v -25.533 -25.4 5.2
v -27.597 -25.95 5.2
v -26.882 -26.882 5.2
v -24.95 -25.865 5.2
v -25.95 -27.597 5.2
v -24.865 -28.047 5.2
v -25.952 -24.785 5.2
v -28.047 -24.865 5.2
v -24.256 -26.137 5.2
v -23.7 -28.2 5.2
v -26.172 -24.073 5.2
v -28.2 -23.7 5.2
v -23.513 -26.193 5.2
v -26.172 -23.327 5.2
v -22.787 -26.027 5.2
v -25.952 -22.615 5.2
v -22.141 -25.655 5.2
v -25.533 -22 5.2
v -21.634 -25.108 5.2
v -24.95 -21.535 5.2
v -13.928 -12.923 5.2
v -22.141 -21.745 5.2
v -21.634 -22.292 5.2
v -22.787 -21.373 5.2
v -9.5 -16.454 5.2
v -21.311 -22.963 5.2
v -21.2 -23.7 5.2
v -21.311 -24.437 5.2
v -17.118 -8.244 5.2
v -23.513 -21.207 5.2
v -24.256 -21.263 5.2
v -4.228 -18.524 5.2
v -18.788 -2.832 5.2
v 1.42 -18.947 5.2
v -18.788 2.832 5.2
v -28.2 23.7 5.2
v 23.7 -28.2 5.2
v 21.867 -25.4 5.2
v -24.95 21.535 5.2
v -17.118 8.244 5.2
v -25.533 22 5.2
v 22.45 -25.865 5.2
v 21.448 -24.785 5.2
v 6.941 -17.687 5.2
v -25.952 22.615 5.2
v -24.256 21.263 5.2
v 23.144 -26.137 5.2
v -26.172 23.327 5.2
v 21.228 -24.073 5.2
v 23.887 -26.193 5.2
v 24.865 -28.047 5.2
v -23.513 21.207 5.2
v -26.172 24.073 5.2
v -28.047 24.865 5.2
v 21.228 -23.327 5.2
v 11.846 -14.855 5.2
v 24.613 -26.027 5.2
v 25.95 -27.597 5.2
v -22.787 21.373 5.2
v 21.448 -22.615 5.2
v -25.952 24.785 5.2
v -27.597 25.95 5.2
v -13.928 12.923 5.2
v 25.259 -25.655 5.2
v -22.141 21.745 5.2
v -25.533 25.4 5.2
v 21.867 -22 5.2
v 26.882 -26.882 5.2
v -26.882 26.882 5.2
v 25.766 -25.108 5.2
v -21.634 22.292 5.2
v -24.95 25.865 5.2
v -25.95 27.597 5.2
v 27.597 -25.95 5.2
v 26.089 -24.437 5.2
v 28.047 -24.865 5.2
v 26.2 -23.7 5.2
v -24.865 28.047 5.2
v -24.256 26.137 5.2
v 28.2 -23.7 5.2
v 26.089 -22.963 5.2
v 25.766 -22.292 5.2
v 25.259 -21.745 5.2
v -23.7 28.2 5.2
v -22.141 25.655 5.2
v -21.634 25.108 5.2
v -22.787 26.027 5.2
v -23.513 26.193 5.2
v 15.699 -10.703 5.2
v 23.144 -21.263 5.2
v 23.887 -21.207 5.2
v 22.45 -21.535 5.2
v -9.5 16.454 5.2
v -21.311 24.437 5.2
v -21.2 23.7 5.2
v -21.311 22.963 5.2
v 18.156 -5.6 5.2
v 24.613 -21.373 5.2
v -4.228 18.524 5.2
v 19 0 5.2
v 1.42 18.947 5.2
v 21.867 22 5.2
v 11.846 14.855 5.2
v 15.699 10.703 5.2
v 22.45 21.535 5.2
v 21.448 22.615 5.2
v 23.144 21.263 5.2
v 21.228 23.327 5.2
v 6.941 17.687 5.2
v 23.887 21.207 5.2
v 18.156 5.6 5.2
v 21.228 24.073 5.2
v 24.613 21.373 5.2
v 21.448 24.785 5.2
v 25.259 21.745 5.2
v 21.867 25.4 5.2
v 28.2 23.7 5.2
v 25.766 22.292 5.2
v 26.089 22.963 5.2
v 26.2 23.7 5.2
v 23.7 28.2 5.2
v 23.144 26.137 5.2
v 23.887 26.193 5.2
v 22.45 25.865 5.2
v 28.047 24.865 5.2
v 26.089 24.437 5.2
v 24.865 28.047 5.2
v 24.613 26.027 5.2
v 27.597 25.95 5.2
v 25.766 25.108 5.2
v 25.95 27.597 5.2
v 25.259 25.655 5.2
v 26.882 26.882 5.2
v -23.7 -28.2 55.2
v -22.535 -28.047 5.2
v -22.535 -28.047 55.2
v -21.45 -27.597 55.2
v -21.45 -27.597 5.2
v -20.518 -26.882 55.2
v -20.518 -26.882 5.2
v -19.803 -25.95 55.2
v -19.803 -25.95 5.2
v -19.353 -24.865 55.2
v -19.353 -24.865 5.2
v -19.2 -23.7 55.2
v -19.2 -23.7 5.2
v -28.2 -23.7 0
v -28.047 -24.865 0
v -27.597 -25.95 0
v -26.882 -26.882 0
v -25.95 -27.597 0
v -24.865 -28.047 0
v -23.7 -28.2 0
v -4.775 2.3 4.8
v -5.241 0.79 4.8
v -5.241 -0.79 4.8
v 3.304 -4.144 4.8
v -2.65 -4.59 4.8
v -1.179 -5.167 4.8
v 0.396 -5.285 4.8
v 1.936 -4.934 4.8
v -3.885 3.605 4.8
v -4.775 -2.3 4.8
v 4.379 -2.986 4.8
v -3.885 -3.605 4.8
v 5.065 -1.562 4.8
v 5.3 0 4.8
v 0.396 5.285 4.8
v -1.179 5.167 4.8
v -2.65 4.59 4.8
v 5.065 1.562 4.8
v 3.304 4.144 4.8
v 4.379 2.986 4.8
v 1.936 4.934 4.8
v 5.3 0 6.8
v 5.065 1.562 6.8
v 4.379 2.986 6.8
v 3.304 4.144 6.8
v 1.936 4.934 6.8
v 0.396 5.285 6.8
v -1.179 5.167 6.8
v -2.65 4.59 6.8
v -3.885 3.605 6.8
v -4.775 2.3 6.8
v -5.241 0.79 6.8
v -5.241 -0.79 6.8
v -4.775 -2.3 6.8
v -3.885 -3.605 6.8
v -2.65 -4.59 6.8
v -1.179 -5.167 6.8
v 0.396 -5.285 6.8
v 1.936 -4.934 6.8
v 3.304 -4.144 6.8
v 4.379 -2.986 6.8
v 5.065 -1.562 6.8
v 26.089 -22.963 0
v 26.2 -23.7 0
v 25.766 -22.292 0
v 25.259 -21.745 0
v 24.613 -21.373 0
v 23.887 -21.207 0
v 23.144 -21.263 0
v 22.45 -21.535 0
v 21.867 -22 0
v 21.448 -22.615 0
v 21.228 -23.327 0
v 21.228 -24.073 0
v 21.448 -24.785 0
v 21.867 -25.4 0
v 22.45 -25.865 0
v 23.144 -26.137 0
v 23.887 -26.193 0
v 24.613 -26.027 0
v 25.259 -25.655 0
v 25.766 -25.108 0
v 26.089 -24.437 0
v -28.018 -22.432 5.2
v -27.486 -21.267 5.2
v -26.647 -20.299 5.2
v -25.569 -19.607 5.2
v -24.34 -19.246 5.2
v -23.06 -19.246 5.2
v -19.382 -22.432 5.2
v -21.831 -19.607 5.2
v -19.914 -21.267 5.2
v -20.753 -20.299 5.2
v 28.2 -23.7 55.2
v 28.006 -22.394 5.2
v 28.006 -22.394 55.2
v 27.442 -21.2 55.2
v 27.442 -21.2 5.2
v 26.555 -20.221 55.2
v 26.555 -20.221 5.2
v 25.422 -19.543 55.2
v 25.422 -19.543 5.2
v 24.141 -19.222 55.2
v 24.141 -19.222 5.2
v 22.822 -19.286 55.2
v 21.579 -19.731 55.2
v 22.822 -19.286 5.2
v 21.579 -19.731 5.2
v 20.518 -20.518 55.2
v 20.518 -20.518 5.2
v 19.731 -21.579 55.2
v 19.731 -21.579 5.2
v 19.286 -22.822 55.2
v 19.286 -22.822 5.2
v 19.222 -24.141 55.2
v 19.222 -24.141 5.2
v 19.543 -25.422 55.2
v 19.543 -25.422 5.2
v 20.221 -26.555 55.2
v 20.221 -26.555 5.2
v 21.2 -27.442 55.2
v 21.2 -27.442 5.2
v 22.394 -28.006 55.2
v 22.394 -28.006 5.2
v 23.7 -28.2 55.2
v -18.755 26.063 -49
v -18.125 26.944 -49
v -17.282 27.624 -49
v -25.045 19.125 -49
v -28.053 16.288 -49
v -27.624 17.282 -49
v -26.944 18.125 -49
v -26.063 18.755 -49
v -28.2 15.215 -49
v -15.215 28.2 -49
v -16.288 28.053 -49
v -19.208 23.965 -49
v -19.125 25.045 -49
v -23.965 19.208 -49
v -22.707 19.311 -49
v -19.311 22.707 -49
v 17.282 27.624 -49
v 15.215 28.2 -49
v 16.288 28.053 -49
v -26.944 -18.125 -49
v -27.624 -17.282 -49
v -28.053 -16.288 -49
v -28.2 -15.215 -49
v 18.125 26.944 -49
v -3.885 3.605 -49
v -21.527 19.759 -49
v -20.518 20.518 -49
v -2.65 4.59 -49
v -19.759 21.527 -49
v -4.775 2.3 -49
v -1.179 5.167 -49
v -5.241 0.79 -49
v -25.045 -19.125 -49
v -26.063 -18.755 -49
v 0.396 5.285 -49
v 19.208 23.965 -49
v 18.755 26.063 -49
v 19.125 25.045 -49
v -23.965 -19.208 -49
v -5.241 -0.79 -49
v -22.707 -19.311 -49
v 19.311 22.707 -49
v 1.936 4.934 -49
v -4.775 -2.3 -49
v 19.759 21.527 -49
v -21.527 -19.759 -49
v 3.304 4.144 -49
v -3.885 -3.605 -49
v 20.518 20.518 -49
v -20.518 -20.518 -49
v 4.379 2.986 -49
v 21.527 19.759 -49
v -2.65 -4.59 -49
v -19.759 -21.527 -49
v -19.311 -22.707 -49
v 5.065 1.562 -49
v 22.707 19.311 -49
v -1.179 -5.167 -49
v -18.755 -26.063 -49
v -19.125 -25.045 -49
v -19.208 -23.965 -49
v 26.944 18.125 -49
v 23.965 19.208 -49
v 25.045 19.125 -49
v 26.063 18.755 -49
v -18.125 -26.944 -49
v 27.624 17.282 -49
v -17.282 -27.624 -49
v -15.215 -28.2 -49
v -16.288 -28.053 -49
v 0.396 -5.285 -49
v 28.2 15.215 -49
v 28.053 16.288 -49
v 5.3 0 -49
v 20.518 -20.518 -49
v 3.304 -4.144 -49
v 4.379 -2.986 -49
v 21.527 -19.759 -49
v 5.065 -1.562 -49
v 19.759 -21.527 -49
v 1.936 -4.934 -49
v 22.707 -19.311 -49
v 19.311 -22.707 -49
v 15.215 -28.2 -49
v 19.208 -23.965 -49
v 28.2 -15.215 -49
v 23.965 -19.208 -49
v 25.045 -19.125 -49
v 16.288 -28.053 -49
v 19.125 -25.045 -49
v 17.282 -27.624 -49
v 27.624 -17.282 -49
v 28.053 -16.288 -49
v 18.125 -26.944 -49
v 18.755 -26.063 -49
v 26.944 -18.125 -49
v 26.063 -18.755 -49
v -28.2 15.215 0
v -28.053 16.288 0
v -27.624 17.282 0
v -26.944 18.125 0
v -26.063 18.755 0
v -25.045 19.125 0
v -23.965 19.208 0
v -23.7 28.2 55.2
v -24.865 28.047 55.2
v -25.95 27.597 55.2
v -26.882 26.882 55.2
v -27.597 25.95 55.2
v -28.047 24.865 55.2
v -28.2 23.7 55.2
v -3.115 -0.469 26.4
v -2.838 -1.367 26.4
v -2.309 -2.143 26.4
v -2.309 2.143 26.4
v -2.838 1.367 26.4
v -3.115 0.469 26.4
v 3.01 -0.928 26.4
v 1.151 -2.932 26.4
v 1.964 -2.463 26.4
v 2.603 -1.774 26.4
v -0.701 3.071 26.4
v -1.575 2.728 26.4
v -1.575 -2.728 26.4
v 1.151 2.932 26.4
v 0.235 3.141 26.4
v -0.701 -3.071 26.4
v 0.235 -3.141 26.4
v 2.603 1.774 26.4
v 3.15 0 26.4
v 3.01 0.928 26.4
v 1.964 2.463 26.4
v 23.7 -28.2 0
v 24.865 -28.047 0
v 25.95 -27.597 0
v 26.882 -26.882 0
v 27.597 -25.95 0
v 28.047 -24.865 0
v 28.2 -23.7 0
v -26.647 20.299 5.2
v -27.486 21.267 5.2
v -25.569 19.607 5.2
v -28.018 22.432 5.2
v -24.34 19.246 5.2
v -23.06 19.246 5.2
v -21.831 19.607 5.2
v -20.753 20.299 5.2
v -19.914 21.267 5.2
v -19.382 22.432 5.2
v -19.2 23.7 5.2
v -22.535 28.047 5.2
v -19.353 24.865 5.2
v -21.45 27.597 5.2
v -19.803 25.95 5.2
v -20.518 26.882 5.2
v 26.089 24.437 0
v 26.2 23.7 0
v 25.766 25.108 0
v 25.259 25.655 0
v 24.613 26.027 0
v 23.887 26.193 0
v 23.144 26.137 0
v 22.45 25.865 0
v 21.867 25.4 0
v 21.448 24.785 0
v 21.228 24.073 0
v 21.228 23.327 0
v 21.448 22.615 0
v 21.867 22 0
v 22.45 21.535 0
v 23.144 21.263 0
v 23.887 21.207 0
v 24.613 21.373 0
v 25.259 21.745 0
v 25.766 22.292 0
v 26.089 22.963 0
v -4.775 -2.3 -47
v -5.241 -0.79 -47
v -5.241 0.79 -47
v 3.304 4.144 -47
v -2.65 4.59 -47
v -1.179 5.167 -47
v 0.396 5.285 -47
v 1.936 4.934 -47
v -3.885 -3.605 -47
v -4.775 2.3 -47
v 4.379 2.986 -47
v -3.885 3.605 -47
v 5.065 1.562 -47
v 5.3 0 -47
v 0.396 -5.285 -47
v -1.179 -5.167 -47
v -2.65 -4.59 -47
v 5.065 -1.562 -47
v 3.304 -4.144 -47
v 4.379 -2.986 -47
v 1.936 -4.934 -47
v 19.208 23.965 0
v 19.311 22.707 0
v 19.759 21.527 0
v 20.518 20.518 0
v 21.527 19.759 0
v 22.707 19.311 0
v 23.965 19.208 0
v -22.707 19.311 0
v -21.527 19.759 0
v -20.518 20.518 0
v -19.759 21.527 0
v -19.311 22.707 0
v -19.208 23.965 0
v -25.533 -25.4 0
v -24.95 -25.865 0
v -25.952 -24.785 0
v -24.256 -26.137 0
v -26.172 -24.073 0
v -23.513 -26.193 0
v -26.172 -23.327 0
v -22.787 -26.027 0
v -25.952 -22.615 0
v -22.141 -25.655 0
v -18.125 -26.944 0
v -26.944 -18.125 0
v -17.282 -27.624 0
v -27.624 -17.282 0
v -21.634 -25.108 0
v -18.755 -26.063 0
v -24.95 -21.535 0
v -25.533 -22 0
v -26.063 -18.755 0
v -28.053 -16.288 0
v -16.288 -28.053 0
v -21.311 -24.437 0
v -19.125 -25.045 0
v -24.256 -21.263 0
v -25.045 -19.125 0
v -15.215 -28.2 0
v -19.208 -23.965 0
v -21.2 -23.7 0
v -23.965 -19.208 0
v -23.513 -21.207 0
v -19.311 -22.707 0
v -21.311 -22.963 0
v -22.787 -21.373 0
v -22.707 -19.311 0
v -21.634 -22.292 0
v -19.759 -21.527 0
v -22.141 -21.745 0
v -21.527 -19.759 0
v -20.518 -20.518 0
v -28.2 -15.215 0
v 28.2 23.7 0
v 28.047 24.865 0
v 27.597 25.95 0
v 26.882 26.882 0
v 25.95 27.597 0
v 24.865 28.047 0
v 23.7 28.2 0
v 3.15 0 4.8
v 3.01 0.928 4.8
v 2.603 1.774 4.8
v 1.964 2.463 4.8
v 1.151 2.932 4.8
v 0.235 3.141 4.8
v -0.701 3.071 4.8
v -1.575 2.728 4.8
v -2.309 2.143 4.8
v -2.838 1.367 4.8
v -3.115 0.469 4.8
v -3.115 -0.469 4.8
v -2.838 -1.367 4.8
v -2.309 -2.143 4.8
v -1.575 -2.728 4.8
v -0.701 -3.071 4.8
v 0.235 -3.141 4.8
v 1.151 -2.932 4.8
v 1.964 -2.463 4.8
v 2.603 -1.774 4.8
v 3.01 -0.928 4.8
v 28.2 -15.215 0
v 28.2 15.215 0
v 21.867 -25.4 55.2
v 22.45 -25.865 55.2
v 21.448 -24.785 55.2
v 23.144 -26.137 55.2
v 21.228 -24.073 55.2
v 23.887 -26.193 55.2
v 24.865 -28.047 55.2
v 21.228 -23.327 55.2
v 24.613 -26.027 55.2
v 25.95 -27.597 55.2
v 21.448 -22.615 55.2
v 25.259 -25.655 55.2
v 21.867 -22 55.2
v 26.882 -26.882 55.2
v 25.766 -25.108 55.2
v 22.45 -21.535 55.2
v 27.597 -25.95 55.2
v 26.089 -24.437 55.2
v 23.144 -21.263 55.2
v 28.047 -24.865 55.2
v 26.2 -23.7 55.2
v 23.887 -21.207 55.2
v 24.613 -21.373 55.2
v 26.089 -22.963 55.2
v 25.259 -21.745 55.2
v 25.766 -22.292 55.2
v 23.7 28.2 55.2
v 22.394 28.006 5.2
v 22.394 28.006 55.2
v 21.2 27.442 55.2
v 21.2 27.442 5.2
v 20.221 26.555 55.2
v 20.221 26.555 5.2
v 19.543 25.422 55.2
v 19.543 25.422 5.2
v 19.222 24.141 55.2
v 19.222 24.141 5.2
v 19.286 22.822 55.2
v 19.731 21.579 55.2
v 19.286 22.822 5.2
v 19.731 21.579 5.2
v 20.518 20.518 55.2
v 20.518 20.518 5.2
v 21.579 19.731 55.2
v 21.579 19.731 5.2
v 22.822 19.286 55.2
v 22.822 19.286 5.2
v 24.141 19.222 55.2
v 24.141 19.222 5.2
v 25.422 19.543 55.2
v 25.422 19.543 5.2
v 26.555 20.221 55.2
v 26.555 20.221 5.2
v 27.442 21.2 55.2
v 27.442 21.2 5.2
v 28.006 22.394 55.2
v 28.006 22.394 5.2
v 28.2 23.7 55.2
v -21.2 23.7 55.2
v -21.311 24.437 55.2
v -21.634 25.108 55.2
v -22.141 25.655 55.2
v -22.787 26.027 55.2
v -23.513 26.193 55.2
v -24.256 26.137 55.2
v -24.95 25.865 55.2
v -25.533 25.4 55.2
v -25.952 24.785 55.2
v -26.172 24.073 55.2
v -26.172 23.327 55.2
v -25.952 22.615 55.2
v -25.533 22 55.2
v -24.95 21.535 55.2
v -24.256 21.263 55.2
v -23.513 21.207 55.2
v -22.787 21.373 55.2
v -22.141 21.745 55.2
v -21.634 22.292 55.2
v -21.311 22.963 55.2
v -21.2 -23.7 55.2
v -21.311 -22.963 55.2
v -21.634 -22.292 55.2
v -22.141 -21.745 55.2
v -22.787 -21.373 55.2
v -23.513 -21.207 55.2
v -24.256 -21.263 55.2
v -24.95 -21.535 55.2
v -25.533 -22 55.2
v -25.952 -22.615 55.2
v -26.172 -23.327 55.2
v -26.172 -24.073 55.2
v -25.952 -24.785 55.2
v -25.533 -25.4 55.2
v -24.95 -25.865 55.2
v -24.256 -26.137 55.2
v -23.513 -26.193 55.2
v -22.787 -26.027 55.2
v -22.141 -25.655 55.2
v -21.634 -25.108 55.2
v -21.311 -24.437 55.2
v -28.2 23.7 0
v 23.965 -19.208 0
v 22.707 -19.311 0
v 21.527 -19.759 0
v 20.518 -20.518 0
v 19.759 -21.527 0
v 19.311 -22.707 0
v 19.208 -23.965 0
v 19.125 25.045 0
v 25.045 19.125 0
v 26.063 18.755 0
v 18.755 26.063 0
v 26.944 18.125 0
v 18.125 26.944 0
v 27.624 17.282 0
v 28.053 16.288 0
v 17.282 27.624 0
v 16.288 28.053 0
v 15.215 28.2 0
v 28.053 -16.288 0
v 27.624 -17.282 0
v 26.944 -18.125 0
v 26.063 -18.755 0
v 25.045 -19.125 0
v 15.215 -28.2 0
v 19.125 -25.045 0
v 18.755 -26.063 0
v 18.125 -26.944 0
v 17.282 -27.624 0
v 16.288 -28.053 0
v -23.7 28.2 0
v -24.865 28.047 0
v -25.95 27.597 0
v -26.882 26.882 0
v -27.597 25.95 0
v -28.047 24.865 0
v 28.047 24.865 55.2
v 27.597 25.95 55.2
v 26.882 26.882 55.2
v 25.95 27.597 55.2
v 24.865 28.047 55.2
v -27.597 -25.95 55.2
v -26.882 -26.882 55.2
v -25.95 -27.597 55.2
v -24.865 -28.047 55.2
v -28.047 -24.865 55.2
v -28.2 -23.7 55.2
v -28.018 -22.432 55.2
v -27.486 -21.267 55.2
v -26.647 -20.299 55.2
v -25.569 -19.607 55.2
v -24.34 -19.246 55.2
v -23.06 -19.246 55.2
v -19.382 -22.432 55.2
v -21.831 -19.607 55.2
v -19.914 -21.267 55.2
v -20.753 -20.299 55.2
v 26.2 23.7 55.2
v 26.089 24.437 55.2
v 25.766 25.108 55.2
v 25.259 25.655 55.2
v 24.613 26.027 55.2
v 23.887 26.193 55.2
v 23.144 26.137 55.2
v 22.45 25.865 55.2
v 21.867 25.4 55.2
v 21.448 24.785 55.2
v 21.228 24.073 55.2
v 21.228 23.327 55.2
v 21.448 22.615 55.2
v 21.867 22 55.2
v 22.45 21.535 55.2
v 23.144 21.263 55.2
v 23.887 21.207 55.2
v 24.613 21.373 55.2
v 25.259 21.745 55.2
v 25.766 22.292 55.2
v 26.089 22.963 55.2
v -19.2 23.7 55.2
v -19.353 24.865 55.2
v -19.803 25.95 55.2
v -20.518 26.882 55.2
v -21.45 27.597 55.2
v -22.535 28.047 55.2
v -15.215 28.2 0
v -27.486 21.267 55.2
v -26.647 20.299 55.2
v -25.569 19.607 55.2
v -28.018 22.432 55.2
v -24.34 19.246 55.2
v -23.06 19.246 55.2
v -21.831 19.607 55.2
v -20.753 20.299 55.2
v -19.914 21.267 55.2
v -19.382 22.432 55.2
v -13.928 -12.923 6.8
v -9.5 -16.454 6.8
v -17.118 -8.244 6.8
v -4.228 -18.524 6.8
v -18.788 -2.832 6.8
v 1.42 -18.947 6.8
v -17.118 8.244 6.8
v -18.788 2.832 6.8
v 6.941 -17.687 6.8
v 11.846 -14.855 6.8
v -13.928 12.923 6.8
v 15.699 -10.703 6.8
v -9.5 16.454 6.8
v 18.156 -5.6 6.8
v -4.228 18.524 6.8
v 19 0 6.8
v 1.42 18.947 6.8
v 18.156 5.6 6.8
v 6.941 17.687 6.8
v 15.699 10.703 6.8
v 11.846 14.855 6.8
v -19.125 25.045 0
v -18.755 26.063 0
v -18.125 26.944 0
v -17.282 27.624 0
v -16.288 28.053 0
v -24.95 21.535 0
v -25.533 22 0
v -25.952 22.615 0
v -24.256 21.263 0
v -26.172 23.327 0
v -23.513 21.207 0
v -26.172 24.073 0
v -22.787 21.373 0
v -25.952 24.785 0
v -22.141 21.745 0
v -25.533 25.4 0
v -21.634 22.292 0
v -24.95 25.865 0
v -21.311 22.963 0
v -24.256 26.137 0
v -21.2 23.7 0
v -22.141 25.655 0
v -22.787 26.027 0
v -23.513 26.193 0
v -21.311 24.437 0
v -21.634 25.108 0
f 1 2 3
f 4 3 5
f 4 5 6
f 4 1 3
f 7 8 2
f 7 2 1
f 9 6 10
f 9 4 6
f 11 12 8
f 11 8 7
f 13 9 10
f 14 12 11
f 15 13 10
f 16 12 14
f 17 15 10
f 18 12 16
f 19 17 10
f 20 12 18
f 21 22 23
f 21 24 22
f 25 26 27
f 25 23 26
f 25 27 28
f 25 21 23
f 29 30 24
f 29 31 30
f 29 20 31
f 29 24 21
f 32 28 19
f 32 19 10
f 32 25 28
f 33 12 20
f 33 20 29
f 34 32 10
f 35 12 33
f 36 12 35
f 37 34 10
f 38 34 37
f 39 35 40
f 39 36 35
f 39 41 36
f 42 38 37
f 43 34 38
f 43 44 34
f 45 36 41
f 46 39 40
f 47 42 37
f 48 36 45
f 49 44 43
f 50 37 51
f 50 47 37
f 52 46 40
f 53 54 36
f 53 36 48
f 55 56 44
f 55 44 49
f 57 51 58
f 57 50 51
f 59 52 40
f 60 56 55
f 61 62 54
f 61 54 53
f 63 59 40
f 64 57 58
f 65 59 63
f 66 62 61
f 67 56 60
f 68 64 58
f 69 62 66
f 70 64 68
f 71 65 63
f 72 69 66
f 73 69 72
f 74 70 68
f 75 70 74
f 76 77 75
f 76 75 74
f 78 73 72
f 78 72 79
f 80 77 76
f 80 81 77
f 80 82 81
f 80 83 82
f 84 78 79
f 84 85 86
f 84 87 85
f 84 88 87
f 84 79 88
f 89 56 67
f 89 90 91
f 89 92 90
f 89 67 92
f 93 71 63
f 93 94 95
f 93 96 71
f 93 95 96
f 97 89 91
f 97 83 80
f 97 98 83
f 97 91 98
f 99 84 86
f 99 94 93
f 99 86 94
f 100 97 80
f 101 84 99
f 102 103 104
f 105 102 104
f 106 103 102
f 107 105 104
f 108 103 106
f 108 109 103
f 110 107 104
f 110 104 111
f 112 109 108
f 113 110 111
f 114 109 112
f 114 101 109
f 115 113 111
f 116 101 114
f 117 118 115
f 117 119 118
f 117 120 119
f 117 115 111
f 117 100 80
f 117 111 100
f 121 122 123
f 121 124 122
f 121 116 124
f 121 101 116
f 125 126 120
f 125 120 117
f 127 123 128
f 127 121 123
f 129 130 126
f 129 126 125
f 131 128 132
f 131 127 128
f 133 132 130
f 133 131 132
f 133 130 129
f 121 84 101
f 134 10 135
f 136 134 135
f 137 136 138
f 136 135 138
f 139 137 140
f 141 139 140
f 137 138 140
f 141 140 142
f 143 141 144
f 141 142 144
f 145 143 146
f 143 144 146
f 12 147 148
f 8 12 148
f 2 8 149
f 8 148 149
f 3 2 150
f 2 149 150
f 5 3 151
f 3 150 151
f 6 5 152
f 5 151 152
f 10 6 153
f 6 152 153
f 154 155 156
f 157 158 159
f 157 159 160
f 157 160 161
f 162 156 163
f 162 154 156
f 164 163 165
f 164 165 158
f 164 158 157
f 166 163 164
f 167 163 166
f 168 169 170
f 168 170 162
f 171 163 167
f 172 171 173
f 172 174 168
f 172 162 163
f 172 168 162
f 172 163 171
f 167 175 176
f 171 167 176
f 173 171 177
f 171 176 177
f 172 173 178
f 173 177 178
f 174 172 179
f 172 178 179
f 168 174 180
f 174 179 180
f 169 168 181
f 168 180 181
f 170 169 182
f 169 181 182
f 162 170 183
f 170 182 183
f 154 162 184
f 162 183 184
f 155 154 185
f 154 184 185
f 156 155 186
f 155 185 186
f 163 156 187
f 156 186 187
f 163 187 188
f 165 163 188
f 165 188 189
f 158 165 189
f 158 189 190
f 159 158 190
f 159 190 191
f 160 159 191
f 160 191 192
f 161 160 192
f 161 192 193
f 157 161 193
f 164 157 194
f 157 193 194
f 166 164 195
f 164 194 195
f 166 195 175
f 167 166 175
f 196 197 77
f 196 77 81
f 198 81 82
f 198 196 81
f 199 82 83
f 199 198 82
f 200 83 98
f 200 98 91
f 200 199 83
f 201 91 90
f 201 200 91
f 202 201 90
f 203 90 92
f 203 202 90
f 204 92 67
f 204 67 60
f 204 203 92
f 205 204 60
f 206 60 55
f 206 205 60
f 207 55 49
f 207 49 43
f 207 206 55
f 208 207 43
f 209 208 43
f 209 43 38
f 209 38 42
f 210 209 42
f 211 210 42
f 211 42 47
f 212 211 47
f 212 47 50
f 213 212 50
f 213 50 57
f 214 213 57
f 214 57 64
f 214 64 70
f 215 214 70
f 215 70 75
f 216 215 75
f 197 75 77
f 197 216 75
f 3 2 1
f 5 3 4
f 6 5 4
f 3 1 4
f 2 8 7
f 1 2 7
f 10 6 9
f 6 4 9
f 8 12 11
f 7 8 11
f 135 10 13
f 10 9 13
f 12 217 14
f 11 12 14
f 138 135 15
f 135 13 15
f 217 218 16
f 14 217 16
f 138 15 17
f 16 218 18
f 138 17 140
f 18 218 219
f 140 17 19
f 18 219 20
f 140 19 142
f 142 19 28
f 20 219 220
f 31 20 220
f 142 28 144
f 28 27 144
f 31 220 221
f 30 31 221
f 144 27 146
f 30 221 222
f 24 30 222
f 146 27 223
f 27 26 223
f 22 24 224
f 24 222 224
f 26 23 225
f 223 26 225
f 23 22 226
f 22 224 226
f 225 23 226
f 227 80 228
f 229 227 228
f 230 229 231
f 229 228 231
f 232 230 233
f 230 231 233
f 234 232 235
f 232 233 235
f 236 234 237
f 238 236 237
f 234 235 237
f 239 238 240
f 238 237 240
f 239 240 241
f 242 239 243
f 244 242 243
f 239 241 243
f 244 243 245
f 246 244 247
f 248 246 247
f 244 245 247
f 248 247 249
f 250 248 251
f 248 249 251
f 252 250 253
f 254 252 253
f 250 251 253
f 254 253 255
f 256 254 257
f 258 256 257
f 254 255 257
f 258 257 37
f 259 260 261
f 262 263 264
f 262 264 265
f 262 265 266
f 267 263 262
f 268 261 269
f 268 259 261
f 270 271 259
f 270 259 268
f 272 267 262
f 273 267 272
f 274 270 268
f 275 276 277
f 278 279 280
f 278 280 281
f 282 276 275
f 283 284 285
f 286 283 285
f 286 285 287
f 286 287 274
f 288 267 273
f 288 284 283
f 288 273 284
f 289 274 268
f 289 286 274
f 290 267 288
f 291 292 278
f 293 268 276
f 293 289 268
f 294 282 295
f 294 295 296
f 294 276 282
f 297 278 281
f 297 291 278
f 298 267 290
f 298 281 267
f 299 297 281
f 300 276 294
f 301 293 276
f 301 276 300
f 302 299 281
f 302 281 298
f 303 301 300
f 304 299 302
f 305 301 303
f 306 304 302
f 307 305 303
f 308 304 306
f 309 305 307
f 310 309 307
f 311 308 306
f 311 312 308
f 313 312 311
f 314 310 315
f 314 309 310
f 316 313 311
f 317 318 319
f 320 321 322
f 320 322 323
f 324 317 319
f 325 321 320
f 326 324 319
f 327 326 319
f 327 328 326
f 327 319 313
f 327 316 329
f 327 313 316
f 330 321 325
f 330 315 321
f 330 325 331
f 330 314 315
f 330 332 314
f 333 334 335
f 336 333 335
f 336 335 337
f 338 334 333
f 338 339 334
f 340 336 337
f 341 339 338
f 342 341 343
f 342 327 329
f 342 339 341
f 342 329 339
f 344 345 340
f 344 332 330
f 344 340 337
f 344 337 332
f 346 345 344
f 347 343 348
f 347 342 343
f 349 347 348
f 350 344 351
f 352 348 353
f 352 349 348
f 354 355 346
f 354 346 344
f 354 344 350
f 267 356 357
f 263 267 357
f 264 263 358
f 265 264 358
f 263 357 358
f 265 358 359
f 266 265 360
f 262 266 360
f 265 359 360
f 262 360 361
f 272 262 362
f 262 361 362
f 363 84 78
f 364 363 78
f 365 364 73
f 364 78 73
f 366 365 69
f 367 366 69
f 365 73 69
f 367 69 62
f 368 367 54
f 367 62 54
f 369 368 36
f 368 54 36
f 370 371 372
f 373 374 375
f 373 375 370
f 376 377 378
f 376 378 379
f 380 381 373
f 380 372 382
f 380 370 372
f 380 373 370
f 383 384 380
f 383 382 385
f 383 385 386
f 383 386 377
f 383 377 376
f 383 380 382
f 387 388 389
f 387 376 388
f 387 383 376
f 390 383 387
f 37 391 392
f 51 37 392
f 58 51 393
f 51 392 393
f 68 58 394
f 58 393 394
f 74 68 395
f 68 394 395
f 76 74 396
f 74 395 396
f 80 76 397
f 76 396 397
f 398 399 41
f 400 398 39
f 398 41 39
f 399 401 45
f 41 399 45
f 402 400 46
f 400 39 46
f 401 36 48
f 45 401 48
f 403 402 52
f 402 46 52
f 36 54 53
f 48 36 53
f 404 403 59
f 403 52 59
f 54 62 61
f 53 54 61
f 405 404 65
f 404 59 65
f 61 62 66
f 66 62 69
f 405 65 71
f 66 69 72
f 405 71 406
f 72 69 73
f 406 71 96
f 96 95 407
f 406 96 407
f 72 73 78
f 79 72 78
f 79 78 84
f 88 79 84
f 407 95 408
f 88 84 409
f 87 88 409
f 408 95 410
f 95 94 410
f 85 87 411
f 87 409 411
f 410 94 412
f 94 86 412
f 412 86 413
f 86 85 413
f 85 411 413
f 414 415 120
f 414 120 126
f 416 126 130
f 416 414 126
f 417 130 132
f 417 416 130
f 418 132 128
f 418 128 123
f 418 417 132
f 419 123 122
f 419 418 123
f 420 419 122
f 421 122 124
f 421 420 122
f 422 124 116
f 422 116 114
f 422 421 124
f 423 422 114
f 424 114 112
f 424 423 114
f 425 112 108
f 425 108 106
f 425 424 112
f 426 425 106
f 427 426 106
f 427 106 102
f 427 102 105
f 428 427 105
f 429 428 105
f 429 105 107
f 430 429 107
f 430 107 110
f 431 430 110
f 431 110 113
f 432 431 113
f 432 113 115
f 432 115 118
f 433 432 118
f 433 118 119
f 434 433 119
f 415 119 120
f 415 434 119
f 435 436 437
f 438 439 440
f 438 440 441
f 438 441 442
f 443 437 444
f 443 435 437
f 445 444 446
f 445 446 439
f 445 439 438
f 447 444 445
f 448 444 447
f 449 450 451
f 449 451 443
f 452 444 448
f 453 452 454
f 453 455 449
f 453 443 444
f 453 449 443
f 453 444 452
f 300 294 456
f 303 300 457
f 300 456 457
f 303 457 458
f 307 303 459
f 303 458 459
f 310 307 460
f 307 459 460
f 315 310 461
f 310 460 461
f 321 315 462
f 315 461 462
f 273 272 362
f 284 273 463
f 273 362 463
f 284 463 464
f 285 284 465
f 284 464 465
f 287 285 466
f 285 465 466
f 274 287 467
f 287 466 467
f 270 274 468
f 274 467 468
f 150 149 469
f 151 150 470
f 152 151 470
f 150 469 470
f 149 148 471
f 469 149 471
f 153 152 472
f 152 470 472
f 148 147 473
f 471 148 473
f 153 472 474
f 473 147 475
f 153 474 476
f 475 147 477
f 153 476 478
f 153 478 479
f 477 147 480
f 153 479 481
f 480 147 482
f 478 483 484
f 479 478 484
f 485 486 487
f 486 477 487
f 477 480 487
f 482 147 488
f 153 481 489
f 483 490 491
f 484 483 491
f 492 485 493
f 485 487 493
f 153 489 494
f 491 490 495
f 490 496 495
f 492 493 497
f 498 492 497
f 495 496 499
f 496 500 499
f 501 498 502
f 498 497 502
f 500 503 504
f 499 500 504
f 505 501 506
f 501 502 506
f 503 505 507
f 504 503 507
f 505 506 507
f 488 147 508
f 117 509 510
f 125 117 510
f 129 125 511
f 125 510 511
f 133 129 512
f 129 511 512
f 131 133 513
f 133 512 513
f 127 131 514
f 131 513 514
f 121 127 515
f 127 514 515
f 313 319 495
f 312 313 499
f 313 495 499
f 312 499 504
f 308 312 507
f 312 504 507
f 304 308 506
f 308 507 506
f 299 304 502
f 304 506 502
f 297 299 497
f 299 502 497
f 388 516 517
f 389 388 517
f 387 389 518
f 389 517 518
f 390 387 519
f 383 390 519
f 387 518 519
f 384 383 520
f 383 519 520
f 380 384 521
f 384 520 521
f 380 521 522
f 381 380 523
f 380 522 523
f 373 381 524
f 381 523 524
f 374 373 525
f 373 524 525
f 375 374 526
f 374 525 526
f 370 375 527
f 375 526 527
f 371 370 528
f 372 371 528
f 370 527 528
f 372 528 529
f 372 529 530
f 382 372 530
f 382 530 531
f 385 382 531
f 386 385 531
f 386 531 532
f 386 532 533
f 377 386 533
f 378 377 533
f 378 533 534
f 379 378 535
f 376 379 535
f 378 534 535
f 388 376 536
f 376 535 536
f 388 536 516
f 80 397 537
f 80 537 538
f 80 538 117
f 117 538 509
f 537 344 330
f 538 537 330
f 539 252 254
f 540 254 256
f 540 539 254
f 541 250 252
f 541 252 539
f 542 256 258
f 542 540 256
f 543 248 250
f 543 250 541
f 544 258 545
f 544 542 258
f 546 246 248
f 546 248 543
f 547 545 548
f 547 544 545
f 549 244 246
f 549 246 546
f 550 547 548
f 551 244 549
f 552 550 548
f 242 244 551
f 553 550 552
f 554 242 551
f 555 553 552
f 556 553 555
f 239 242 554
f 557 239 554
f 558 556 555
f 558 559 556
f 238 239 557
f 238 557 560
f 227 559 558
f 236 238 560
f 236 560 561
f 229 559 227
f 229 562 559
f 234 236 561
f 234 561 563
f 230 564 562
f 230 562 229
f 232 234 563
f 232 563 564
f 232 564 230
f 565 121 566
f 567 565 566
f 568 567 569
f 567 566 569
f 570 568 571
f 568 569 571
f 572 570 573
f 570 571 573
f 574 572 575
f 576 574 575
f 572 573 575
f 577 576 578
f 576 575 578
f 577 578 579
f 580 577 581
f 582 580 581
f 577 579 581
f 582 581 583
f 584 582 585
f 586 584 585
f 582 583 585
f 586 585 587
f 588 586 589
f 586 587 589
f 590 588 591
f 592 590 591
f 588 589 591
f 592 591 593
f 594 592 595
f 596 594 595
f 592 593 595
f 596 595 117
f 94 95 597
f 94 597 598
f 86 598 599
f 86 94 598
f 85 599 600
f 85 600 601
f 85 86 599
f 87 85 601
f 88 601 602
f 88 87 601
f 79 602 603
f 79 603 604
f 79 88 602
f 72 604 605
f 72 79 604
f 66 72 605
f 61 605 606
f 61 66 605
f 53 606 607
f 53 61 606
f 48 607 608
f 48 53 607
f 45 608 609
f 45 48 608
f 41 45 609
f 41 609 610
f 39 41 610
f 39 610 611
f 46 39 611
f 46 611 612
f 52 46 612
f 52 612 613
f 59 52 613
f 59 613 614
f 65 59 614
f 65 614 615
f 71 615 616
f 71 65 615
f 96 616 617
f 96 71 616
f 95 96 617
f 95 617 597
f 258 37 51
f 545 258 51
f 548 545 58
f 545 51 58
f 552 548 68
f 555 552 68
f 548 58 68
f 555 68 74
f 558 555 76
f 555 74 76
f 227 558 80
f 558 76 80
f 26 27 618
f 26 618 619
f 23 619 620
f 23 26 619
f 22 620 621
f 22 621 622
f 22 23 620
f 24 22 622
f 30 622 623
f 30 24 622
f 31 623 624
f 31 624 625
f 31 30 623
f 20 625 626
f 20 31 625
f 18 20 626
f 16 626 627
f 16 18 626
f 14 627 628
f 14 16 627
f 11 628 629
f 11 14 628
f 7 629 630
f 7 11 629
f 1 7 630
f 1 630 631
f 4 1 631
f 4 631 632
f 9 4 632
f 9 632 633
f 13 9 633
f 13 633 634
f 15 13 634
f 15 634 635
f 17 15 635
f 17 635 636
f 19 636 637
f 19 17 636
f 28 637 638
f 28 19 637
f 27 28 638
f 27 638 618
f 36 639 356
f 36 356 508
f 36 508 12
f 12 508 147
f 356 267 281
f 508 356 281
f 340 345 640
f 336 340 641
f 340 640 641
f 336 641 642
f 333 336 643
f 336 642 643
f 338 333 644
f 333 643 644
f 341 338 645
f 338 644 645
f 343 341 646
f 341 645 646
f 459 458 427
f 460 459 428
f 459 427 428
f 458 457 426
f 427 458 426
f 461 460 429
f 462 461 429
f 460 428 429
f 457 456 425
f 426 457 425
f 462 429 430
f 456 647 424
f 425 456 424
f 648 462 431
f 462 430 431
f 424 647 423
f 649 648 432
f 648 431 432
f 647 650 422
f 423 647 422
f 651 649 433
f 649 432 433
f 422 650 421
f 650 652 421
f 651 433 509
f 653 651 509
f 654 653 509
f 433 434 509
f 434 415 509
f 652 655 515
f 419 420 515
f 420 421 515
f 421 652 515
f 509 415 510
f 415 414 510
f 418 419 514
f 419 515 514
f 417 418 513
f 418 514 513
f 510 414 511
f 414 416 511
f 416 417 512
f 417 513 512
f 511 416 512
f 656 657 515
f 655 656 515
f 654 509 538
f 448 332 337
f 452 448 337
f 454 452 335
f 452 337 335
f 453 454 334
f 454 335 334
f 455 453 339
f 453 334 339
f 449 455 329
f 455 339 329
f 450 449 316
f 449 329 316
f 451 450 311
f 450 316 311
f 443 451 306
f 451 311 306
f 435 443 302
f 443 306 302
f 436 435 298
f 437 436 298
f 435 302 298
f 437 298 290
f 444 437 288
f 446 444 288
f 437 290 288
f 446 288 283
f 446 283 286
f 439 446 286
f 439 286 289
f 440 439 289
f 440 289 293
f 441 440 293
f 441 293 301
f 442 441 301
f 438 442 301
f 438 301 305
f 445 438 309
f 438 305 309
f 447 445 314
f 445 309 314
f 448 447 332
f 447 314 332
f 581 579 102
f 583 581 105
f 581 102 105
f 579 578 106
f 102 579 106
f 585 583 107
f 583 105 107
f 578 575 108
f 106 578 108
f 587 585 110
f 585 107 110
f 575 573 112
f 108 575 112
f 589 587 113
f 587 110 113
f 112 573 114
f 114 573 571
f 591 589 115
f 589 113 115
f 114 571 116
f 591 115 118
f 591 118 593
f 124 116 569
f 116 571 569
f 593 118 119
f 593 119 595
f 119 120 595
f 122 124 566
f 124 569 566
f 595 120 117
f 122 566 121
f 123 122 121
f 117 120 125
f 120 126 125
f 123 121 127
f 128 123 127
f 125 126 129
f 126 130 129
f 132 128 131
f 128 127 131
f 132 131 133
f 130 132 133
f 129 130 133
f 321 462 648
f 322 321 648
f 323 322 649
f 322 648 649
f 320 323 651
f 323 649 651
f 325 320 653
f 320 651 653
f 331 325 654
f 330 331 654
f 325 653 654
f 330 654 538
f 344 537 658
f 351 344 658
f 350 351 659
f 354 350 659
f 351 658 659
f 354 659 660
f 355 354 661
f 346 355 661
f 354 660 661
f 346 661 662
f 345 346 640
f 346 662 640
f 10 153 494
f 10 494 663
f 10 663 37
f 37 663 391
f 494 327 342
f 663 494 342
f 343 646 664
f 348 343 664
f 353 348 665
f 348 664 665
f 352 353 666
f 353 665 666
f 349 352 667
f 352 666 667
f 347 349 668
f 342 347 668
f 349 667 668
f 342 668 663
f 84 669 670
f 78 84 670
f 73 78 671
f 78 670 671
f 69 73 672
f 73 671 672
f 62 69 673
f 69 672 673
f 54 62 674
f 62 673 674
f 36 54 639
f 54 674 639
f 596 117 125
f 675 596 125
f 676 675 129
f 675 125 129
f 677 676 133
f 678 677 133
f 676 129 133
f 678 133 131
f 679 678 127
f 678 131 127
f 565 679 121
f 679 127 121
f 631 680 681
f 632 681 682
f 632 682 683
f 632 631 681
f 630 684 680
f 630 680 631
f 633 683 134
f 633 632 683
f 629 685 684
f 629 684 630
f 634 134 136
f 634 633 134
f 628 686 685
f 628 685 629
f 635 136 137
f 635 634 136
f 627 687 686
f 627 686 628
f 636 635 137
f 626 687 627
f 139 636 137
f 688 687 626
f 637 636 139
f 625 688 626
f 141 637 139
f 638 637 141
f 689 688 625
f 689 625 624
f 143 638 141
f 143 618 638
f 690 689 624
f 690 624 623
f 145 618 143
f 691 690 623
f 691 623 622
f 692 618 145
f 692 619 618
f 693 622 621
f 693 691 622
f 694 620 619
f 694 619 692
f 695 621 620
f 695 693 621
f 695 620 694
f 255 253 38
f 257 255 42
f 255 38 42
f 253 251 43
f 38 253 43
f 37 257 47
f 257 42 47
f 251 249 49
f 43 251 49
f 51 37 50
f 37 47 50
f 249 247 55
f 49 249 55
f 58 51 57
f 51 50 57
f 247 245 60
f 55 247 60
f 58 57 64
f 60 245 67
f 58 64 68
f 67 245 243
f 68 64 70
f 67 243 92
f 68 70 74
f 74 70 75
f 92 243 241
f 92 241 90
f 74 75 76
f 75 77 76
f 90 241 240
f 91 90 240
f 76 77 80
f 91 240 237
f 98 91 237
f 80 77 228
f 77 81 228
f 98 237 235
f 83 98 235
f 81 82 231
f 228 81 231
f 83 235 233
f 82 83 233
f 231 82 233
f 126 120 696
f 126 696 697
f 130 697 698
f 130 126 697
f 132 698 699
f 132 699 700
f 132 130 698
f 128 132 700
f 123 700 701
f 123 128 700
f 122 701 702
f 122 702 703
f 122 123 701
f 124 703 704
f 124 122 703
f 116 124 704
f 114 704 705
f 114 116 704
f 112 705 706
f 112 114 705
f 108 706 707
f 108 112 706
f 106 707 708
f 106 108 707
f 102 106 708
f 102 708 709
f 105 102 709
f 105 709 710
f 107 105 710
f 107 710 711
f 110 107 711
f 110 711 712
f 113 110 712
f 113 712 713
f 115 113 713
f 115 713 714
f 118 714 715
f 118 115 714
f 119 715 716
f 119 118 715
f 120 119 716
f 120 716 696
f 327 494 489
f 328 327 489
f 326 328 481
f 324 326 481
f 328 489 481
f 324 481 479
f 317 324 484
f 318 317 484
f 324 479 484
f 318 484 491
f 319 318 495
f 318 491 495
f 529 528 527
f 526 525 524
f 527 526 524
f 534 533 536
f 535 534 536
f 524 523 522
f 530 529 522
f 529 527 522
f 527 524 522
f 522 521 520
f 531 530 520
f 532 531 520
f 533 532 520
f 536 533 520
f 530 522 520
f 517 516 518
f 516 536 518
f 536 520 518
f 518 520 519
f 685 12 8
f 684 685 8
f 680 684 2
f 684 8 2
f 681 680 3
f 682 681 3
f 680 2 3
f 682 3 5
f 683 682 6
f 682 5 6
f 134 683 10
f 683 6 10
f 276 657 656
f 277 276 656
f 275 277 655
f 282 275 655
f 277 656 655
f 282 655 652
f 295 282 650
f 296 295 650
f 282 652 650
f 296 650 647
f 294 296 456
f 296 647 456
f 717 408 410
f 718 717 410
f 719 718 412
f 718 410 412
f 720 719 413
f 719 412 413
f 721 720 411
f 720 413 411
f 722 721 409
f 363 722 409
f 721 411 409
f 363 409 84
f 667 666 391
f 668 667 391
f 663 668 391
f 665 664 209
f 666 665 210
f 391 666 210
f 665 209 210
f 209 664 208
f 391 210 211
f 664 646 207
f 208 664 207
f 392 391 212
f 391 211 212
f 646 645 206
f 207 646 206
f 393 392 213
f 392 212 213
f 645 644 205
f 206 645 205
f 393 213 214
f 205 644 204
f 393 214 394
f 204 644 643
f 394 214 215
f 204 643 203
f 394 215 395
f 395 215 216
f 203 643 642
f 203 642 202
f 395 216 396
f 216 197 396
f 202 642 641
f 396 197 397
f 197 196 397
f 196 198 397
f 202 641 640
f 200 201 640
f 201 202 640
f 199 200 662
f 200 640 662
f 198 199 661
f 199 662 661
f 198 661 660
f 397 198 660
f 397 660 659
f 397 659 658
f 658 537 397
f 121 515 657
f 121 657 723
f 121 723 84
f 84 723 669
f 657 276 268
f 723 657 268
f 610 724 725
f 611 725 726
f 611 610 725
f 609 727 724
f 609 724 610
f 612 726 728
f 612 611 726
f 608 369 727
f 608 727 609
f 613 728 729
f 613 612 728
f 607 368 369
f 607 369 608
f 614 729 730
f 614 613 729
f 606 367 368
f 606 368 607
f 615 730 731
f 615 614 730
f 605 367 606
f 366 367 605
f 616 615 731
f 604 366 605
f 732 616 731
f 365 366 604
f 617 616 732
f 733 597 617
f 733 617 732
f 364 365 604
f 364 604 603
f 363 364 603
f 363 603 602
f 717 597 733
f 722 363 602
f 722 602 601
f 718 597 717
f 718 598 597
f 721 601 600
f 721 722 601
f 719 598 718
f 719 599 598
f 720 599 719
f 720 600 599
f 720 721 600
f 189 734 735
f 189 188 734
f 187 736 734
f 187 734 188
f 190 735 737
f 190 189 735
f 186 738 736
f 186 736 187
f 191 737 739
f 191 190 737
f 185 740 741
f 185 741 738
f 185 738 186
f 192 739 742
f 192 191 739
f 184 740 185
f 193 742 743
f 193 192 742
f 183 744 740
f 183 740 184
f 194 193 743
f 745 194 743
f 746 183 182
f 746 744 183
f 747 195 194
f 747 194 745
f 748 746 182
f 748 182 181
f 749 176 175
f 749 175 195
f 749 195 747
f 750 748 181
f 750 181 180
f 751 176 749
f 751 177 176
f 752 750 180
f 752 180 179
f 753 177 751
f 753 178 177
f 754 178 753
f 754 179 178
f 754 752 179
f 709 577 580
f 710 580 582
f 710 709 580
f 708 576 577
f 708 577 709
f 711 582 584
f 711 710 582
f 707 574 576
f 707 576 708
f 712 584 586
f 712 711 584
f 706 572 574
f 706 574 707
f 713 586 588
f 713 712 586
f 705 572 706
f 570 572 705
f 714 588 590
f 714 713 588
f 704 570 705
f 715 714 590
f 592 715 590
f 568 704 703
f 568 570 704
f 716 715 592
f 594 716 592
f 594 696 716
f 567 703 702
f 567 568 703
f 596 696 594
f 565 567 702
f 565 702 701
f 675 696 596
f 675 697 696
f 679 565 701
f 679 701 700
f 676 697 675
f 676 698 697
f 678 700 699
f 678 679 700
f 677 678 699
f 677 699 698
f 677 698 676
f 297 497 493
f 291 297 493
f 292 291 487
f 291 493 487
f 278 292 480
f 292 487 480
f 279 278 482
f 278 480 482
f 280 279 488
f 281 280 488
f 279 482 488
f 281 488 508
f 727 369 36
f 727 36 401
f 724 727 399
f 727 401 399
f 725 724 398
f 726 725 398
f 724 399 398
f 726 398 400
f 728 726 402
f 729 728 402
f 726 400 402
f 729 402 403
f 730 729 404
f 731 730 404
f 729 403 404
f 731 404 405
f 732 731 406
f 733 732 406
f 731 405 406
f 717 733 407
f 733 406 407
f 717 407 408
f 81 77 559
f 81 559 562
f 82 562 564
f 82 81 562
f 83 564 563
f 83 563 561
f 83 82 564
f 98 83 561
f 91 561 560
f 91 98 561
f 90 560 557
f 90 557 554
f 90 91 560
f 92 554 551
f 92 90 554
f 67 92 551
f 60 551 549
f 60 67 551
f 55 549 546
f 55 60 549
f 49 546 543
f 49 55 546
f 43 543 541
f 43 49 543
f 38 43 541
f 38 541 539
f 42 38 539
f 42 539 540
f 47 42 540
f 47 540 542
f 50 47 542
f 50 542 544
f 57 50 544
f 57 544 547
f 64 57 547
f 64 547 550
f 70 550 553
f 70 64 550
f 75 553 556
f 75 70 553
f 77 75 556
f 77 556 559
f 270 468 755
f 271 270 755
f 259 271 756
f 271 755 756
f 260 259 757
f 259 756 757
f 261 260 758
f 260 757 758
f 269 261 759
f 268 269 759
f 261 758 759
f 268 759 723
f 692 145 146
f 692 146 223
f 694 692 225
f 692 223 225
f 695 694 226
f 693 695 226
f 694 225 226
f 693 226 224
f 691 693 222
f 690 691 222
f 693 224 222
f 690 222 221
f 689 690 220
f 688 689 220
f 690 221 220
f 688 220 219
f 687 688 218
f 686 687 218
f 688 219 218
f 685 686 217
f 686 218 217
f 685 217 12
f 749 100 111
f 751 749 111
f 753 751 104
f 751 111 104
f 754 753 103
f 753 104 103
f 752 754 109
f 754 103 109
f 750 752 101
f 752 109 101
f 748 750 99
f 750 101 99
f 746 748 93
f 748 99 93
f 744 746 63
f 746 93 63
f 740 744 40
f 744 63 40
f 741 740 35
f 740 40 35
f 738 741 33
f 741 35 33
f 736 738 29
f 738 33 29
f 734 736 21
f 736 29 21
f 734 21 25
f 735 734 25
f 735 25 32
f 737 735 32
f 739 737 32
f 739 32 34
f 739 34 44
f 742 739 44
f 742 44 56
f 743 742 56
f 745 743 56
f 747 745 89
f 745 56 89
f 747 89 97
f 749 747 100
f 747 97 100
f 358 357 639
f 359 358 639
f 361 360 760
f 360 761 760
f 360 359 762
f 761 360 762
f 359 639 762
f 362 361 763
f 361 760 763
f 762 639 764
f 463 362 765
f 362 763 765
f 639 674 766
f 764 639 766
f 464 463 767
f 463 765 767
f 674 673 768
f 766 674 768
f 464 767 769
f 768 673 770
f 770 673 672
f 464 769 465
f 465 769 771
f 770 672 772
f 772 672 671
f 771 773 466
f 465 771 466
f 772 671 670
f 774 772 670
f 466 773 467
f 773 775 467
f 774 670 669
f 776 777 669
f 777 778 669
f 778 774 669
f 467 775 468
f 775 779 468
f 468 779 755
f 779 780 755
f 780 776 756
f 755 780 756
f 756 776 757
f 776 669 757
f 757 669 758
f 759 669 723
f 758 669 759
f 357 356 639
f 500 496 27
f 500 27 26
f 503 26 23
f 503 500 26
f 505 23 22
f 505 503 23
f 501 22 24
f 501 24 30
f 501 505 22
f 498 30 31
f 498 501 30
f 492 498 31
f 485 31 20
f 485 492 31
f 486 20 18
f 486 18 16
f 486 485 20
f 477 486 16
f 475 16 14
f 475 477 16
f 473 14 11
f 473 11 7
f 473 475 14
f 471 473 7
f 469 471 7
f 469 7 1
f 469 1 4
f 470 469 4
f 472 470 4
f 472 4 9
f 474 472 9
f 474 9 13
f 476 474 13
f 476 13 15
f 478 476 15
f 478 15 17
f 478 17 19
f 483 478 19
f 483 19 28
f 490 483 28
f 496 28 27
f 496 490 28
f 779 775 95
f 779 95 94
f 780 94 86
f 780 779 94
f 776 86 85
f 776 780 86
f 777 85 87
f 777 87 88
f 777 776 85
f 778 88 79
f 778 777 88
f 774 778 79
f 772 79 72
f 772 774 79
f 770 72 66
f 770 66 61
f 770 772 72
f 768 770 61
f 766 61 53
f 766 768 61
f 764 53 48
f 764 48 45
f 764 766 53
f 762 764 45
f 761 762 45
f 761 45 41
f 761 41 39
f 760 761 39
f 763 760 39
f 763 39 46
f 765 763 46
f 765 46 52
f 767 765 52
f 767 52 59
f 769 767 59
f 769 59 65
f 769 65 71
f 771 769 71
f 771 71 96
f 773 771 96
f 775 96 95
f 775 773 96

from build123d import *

# Parameters (mm, degrees)
F0_R      = 2.5
F1_DEPTH  = 5.2
F3_DEPTH  = 49
F4_R      = 19
F5_DEPTH  = 1.6
F6_R      = 5.3
F8_DEPTH  = 2
F9_R      = 3.15
F10_DEPTH = 21.6
F7_R      = 5.3
F11_DEPTH = 2
F12_R     = 2.5
F13_DEPTH = 50


with BuildPart() as f1:
    # F0 (on Top) → F1 (new body)
    with BuildSketch(Plane.XY):
        with BuildLine():
            Line((23.7, 28.2), (-23.7, 28.2))
            ThreePointArc((-23.7, 28.2), (-26.8819805153, 26.8819805153), (-28.2, 23.7))
            Line((-28.2, 23.7), (-28.2, -23.7))
            ThreePointArc((-28.2, -23.7), (-26.8819805153, -26.8819805153), (-23.7, -28.2))
            Line((-23.7, -28.2), (23.7, -28.2))
            ThreePointArc((23.7, -28.2), (26.8819805153, -26.8819805153), (28.2, -23.7))
            Line((28.2, -23.7), (28.2, 23.7))
            ThreePointArc((28.2, 23.7), (26.8819805153, 26.8819805153), (23.7, 28.2))
        make_face()
        with Locations((-23.7, -23.7)):
            Circle(F0_R, mode=Mode.SUBTRACT)
        with Locations((23.7, -23.7)):
            Circle(F0_R, mode=Mode.SUBTRACT)
        with Locations((-23.7, 23.7)):
            Circle(F0_R, mode=Mode.SUBTRACT)
        with Locations((23.7, 23.7)):
            Circle(F0_R, mode=Mode.SUBTRACT)
    extrude(amount=F1_DEPTH)

    # F2 (on face) → F3 (join)
    with BuildSketch(Plane(origin=(0, 0, 0), x_dir=(1, 0, 0), z_dir=(0, 0, -1))):
        with BuildLine():
            ThreePointArc((-19.2077922136, -23.9647058824), (-18.1251461262, -26.9439773623), (-15.2147186258, -28.2))
            Line((-15.2147186258, -28.2), (15.2147186258, -28.2))
            ThreePointArc((15.2147186258, -28.2), (18.1251461262, -26.9439773623), (19.2077922136, -23.9647058824))
            ThreePointArc((19.2077922136, -23.9647058824), (20.5180194847, -20.5180194847), (23.9647058824, -19.2077922136))
            ThreePointArc((23.9647058824, -19.2077922136), (26.9439773623, -18.1251461262), (28.2, -15.2147186258))
            Line((28.2, -15.2147186258), (28.2, 15.2147186258))
            ThreePointArc((28.2, 15.2147186258), (26.9439773623, 18.1251461262), (23.9647058824, 19.2077922136))
            ThreePointArc((23.9647058824, 19.2077922136), (20.5180194847, 20.5180194847), (19.2077922136, 23.9647058824))
            ThreePointArc((19.2077922136, 23.9647058824), (18.1251461262, 26.9439773623), (15.2147186258, 28.2))
            Line((15.2147186258, 28.2), (-15.2147186258, 28.2))
            ThreePointArc((-15.2147186258, 28.2), (-18.1251461262, 26.9439773623), (-19.2077922136, 23.9647058824))
            ThreePointArc((-19.2077922136, 23.9647058824), (-20.5180194847, 20.5180194847), (-23.9647058824, 19.2077922136))
            ThreePointArc((-23.9647058824, 19.2077922136), (-26.9439773623, 18.1251461262), (-28.2, 15.2147186258))
            Line((-28.2, 15.2147186258), (-28.2, -15.2147186258))
            ThreePointArc((-28.2, -15.2147186258), (-26.9439773623, -18.1251461262), (-23.9647058824, -19.2077922136))
            ThreePointArc((-23.9647058824, -19.2077922136), (-20.5180194847, -20.5180194847), (-19.2077922136, -23.9647058824))
        make_face()
    extrude(amount=F3_DEPTH)

    # F4 (on face) → F5 (join)
    with BuildSketch(Plane.XY.offset(5.2)):
        Circle(F4_R)
    extrude(amount=F5_DEPTH)

    # F6 (on face) → F8 (cut)
    with BuildSketch(Plane.XY.offset(6.8)):
        Circle(F6_R)
    extrude(amount=-F8_DEPTH, mode=Mode.SUBTRACT)

    # F7 (on face) → F11 (cut)
    with BuildSketch(Plane(origin=(0, 0, -49), x_dir=(1, 0, 0), z_dir=(0, 0, -1))):
        Circle(F7_R)
    extrude(amount=-F11_DEPTH, mode=Mode.SUBTRACT)


with BuildPart() as f10:
    # F9 (on face) → F10 (new body)
    with BuildSketch(Plane.XY.offset(4.8)):
        Circle(F9_R)
    extrude(amount=F10_DEPTH)


with BuildPart() as f13:
    # F12 (on face) → F13 (new body)
    with BuildSketch(Plane.XY.offset(5.2)):
        with BuildLine():
            ThreePointArc((23.7, -28.2), (26.8819805153, -26.8819805153), (28.2, -23.7))
            ThreePointArc((28.2, -23.7), (20.5180194847, -20.5180194847), (23.7, -28.2))
        make_face()
        with Locations((23.7, -23.7)):
            Circle(F12_R, mode=Mode.SUBTRACT)
    extrude(amount=F13_DEPTH)


with BuildPart() as f13b:
    # F12 (on face) → F13, piece 2 (new body)
    with BuildSketch(Plane.XY.offset(5.2)):
        with BuildLine():
            ThreePointArc((-19.2, -23.7), (-23.7, -19.2), (-28.2, -23.7))
            ThreePointArc((-28.2, -23.7), (-26.8819805153, -26.8819805153), (-23.7, -28.2))
            ThreePointArc((-23.7, -28.2), (-20.5180194847, -26.8819805153), (-19.2, -23.7))
        make_face()
        with Locations((-23.7, -23.7)):
            Circle(F12_R, mode=Mode.SUBTRACT)
    extrude(amount=F13_DEPTH)


with BuildPart() as f13c:
    # F12 (on face) → F13, piece 3 (new body)
    with BuildSketch(Plane.XY.offset(5.2)):
        with BuildLine():
            ThreePointArc((-28.2, 23.7), (-23.7, 19.2), (-19.2, 23.7))
            ThreePointArc((-19.2, 23.7), (-20.5180194847, 26.8819805153), (-23.7, 28.2))
            ThreePointArc((-23.7, 28.2), (-26.8819805153, 26.8819805153), (-28.2, 23.7))
        make_face()
        with Locations((-23.7, 23.7)):
            Circle(F12_R, mode=Mode.SUBTRACT)
    extrude(amount=F13_DEPTH)


with BuildPart() as f13d:
    # F12 (on face) → F13, piece 4 (new body)
    with BuildSketch(Plane.XY.offset(5.2)):
        with BuildLine():
            ThreePointArc((28.2, 23.7), (26.8819805153, 26.8819805153), (23.7, 28.2))
            ThreePointArc((23.7, 28.2), (20.5180194847, 20.5180194847), (28.2, 23.7))
        make_face()
        with Locations((23.7, 23.7)):
            Circle(F12_R, mode=Mode.SUBTRACT)
    extrude(amount=F13_DEPTH)


solid = Compound([f1.part, f10.part, f13.part, f13b.part, f13c.part, f13d.part])
